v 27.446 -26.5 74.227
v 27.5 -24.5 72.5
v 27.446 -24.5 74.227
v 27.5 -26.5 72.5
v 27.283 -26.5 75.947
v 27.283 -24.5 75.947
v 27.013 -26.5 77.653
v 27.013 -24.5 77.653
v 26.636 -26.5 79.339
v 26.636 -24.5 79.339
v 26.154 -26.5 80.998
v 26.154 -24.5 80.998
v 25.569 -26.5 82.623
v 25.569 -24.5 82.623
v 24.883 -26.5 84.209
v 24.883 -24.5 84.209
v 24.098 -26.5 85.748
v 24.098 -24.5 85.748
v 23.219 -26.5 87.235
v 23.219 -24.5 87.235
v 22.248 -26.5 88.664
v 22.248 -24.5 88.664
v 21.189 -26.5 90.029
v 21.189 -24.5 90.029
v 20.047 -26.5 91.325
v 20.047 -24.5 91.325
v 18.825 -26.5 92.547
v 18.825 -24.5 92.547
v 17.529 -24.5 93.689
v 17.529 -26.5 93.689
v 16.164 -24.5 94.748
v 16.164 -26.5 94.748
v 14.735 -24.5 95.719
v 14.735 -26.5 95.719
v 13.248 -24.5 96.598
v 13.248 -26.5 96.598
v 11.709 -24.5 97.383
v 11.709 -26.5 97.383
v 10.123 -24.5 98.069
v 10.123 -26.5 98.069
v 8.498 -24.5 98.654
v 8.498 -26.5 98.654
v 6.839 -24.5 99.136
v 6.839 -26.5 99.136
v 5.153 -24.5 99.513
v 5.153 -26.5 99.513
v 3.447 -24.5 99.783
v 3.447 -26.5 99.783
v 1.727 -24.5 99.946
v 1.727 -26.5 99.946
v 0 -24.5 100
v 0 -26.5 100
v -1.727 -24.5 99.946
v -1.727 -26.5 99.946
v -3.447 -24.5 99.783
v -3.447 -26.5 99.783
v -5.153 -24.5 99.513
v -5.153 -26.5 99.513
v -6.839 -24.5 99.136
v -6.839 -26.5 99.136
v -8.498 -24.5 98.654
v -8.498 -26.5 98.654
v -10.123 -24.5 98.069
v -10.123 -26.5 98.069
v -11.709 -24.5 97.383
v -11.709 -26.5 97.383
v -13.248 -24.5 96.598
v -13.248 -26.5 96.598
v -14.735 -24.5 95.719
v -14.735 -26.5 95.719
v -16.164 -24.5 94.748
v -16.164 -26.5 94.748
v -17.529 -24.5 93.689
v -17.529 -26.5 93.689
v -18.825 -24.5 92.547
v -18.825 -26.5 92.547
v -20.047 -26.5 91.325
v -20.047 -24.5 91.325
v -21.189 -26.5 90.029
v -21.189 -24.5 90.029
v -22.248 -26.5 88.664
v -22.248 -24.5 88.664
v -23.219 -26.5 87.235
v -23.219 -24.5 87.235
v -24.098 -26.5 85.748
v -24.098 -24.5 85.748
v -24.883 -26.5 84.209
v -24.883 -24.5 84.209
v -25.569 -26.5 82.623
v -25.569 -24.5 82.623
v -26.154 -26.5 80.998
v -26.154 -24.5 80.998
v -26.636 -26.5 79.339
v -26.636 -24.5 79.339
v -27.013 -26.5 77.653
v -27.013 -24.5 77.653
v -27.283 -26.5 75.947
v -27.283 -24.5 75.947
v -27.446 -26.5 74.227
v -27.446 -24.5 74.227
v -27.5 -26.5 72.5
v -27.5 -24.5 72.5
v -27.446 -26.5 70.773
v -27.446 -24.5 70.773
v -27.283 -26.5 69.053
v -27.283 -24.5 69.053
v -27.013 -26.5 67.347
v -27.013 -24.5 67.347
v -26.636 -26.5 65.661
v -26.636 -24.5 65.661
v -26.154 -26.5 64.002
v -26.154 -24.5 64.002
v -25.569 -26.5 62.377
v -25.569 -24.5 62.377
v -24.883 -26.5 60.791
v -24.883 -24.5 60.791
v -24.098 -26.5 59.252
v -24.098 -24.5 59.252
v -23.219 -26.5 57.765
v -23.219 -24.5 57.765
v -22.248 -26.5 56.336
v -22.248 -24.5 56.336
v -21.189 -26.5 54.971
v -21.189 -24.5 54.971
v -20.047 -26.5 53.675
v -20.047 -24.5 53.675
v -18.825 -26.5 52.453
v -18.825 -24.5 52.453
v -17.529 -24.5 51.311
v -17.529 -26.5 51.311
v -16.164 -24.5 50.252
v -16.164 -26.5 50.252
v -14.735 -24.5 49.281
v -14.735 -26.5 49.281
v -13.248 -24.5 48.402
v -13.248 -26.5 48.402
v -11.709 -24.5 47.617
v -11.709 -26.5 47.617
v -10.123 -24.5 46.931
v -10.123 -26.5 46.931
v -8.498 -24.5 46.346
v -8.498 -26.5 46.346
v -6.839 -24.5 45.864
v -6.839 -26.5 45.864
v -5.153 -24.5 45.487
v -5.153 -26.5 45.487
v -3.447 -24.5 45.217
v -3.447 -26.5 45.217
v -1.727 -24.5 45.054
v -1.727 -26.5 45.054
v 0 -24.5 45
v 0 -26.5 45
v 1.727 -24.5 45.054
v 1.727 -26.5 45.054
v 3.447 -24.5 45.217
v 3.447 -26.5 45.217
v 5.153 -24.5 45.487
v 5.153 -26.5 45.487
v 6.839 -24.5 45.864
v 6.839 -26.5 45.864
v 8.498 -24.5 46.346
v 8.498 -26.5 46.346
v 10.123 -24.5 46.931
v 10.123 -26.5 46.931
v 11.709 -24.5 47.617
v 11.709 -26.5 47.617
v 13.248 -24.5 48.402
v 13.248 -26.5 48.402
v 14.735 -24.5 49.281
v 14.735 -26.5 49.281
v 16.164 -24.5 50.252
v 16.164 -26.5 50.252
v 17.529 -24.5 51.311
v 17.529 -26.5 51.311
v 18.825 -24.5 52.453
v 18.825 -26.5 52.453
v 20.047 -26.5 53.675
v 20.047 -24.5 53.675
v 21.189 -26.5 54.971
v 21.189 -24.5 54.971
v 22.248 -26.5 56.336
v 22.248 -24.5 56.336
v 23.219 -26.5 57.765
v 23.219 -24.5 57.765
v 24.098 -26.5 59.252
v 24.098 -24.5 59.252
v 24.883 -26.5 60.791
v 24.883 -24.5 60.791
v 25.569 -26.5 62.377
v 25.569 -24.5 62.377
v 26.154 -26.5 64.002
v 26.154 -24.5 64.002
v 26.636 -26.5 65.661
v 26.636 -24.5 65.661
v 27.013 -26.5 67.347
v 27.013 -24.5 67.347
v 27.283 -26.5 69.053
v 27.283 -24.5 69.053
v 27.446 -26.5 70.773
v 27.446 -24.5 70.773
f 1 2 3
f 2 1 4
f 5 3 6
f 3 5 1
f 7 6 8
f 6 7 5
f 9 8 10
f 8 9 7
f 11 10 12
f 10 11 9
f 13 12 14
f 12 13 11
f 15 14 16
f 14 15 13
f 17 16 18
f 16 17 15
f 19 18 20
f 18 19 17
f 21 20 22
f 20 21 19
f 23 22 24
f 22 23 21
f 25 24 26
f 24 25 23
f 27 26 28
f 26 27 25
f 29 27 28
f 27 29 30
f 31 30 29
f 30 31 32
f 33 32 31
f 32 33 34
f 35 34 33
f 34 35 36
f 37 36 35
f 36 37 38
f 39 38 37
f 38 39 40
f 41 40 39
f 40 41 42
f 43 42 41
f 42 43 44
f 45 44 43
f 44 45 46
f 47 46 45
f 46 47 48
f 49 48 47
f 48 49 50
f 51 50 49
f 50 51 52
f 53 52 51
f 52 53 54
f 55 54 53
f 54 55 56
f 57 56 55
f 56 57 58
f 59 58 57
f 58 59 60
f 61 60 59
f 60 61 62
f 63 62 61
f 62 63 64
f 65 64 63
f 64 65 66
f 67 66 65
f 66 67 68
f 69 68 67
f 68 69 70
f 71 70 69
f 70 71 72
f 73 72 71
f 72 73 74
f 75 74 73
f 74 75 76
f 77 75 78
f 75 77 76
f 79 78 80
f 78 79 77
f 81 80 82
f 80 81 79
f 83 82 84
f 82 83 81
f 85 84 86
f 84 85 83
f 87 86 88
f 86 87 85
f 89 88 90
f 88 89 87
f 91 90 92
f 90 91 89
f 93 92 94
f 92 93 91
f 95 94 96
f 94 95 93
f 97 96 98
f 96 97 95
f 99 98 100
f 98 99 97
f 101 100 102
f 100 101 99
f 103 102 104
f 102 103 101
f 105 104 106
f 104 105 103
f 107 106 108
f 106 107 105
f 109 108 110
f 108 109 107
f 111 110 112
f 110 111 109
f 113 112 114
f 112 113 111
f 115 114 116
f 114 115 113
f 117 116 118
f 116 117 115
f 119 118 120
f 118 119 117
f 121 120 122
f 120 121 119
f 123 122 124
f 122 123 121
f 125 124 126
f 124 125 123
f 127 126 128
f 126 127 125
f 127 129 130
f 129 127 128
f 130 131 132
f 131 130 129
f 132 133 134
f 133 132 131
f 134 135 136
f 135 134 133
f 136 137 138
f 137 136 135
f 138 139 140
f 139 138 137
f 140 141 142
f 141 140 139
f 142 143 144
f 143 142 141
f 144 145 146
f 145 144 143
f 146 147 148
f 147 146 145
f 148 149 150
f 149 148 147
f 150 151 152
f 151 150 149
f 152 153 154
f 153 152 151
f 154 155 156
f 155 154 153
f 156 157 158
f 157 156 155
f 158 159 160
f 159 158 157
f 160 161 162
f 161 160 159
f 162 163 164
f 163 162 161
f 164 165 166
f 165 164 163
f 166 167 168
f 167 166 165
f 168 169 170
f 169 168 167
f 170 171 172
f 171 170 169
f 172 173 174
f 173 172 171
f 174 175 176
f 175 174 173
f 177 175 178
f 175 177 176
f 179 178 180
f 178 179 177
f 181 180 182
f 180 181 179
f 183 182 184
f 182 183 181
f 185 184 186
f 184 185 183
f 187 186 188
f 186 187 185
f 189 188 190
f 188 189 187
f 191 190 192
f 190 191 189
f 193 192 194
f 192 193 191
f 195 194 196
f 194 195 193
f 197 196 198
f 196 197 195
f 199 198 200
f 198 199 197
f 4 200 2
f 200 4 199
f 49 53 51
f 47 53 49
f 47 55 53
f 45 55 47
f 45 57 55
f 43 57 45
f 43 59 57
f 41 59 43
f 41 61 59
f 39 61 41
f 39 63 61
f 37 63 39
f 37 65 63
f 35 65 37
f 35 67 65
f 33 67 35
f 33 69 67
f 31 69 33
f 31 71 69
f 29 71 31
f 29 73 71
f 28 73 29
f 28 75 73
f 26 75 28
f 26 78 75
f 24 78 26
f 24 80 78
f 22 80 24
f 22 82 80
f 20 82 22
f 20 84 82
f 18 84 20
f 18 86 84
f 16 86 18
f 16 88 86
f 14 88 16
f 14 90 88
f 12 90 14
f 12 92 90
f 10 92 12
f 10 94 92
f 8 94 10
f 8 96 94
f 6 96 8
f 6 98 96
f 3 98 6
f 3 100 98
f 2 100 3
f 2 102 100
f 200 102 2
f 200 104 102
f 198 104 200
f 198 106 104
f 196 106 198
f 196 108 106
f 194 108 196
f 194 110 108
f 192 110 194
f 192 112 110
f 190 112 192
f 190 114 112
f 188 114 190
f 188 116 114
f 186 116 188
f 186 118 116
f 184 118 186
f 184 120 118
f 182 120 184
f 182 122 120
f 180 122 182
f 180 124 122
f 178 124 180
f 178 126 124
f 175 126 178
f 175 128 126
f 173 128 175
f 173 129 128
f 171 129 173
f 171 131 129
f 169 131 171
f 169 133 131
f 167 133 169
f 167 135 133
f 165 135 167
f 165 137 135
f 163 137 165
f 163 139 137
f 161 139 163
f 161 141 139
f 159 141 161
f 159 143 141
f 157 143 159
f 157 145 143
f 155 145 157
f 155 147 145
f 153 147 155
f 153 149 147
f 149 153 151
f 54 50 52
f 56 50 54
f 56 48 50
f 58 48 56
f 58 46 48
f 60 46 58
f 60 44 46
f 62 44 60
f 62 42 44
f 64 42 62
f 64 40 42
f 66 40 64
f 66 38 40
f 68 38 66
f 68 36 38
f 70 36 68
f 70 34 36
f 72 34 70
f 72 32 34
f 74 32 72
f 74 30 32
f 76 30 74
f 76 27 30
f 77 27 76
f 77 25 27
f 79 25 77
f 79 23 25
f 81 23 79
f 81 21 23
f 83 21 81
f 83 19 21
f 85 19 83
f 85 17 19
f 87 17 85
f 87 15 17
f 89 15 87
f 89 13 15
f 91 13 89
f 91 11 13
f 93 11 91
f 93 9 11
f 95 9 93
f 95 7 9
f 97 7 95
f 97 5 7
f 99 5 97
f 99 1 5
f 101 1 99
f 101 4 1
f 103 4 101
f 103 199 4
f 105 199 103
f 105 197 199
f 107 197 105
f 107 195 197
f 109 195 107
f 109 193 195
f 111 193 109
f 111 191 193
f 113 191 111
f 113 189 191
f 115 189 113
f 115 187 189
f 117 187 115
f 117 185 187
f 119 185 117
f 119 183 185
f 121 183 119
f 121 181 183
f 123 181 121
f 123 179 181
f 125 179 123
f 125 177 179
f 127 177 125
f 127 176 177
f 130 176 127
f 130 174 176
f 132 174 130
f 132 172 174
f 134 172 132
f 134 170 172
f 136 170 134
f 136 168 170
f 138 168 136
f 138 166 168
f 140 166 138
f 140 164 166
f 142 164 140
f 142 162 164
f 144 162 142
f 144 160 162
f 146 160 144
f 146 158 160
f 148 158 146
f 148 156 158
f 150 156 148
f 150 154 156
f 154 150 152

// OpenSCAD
//
// ktAIR1
//

gap1 = 0.001;
gap2 = 0.002;
th = 2;
fx = 141+th*2;
fy = 141+th*2;
fd = 24.5;
cx = 124;
cy = 130;
cd = 25;
cr = 0.7;


A = 0;
B = 0;
C = 0;
D = 0;
E = 0;
F = 1;

if(A)
{
    fan( -(24.5+th*3)/2 );
}
if(B)
{
    socket_a( 25/2 );
    filter1( 35/2 );
}
if(C)
{
    filter2( 105 );
    rear( 140+th/2 );
}
if(D)
{
    difference()
    {
        translate ( [-fx/2, -fd, 0] ) cube( [fx, fd, fy] );
        translate ( [-fx/2+th, -fd-gap1, th] ) cube( [fx-th*2, fd+gap2, fy-th*2] );
        translate ( [161/2, -fd-3, +22] ) cube( [50, 20, 5], center=true );
    }
    difference()
    {
        union()
        {
            translate ( [-cx/2, (fy-cy)-th/sqrt(2), 0] ) cube( [cx, cd, cy*2/3] );
            translate ( [-cx/2+4, (fy-cy)-th/sqrt(2)+cd, cy/2+4] ) 
            rotate( [90, 0, 0] )
            minkowski()
            {
                cube( [cx-4*2, cy/2-4*2, cd-1] );
                cylinder( r=4, h=1, $fn=50 );
            }
        }
        translate ( [-cx/2+th*cr, (fy-cy)-th/sqrt(2)-gap1, th*cr] ) cube( [cx-th*2*cr, cd+gap2, cy*2/3-th*2*cr] );
        translate ( [-cx/2+4+th*cr, (fy-cy)-th/sqrt(2)+cd+gap1, cy/2+4+th*cr] ) 
        rotate( [90, 0, 0] )
        minkowski()
        {
            cube( [cx-4*2-th*2*cr, cy/2-4*2-th*2*cr, cd+gap2] );
            cylinder( r=4, h=1, $fn=50 );
        }
    }    
    
    difference()
    {
        union()
        {
            translate ( [-fx/2, 0, 0] ) rotate( [0, 0, -atan(((fx-cx)/2)/(fy-cy))] ) cube( [th, ((fx-cx)/2)/sin(atan(((fx-cx)/2)/(fy-cy))), fy] );
            translate ( [fx/2-(th*cos(atan(((fx-cx)/2)/(fy-cy)))), -(th*sin(atan(((fx-cx)/2)/(fy-cy)))), 0] ) rotate( [0, 0, atan(((fx-cx)/2)/(fy-cy))] ) cube( [th, ((fx-cx)/2)/sin(atan(((fx-cx)/2)/(fy-cy))), fy] );
            translate ( [-fx/2, (fy-cy)-th/sqrt(2), cy-th/sqrt(2)] ) rotate( [45, 0, 0] ) cube( [fx, th, (fy-cy)*sqrt(2)] );
            translate ( [-fx/2, 0, ] ) cube( [fx, (fy-cy), th] );
        }
        translate ( [-fx/2-(th*5*cos(atan(((fx-cx)/2)/(fy-cy)))), (th*5*sin(atan(((fx-cx)/2)/(fy-cy)))), -gap1] ) rotate( [0, 0, -atan(((fx-cx)/2)/(fy-cy))] ) cube( [th*5, ((fx-cx)/2)/sin(atan(((fx-cx)/2)/(fy-cy))), fy+gap2] );
        translate ( [fx/2, 0, -gap1] ) rotate( [0, 0, atan(((fx-cx)/2)/(fy-cy))] ) cube( [th*5, ((fx-cx)/2)/sin(atan(((fx-cx)/2)/(fy-cy))), fy+gap2] );
        translate ( [-fx/2, (fy-cy), cy] ) rotate( [45, 0, 0] ) cube( [fx, th*6, (fy-cy)*sqrt(2)] );
    }
}

if(E)
{
    difference()
    {
        translate ( [-fx/2, -fd-th, 0] ) cube( [fx, th, fy] );
        translate ( [0, -fd+th+gap1, fy/2] ) rotate( [90, 0, 0] ) cylinder( th*2+gap2, 120/2, 120/2, $fn=100 );
    }
}

if(F)
{
    translate ( [0, -fd, fy/2] ) rotate( [90, 0, 0] ) cylinder( th, 55/2, 55/2, $fn=100 );
}

module fan( y=0 )
{
    translate( [0, y, 0] )
    {
        difference()
        {
            translate ( [0, 0, -((161+th*2)-139)/2+th] ) cube( [157+th*2, 24.5+th, fy], center=true );
            translate ( [0, th/2, -((161+th*2)-139)/2+th] ) cube( [139, 24.5+gap2, 139], center=true );
            translate ( [0, -((24.5+th)/2)+th, -((161+th*2)-139)/2+th] ) rotate( [90, 0, 0] ) cylinder( th*2, 135/2, 135/2, $fn=100 );
            translate ( [161/2-(157-139)/4-th/2, th/2, -((161+th*2)-139)/2+th] ) cube( [(157-139)/2-th, 24.5+gap2, 139], center=true );
            translate ( [-(161/2-(157-139)/4-th/2), th/2, -((161+th*2)-139)/2+th] ) cube( [(157-139)/2-th, 24.5+gap2, 139], center=true );
            translate ( [161/2, 19, -161/2+22] ) rotate( [0, 0, 10] ) cube( [50, 20, 5], center=true );
        }
    }
}

module socket_a( y=0 )
{
    translate( [0, y, 0] )
    {
        difference()
        {
            union()
            {
                translate ( [0, 0, -30/2] ) cube( [cx, 25, cy], center=true );
                translate ( [0, -25/2-th/2, 0] ) cube( [157+th*2, th, 161+th*2], center=true );
            }
            translate ( [0, -th/2, -30/2] ) cube( [cx-th, 25+th+gap2, cy-th], center=true );
        }
    }
}

module filter1( y=0 )
{
    translate( [0, y, 0] )
    {
        difference()
        {
            cube( [157+th*2, 35, 161+th*2], center=true );
            cube( [157, 35+gap2, 161], center=true );
            translate ( [0, th, -161/2-th/2] ) cube( [cx+4, 35+2, th*2], center=true );
        }
    }
}

module filter2( y=0 )
{
    translate( [0, y/2, 0] )
    {
        difference()
        {
            cube( [157+th*2, 35, 161+th*2], center=true );
            cube( [157, 35+gap2, 161], center=true );
        }
    }
}

module rear( y=0 )
{
    translate( [0, y/2, 0] )
    {
        difference()
        {
            cube( [157+th*2, th, 161+th*2], center=true );
            $fn=50;
            rotate( [90, 0, 0] )
            {
                minkowski()
                {
                  cube( [133-10*2, 127-10*2, 25], center=true );
                  cylinder( r=10, h=1 );
                }
            }
        }
    }
}
